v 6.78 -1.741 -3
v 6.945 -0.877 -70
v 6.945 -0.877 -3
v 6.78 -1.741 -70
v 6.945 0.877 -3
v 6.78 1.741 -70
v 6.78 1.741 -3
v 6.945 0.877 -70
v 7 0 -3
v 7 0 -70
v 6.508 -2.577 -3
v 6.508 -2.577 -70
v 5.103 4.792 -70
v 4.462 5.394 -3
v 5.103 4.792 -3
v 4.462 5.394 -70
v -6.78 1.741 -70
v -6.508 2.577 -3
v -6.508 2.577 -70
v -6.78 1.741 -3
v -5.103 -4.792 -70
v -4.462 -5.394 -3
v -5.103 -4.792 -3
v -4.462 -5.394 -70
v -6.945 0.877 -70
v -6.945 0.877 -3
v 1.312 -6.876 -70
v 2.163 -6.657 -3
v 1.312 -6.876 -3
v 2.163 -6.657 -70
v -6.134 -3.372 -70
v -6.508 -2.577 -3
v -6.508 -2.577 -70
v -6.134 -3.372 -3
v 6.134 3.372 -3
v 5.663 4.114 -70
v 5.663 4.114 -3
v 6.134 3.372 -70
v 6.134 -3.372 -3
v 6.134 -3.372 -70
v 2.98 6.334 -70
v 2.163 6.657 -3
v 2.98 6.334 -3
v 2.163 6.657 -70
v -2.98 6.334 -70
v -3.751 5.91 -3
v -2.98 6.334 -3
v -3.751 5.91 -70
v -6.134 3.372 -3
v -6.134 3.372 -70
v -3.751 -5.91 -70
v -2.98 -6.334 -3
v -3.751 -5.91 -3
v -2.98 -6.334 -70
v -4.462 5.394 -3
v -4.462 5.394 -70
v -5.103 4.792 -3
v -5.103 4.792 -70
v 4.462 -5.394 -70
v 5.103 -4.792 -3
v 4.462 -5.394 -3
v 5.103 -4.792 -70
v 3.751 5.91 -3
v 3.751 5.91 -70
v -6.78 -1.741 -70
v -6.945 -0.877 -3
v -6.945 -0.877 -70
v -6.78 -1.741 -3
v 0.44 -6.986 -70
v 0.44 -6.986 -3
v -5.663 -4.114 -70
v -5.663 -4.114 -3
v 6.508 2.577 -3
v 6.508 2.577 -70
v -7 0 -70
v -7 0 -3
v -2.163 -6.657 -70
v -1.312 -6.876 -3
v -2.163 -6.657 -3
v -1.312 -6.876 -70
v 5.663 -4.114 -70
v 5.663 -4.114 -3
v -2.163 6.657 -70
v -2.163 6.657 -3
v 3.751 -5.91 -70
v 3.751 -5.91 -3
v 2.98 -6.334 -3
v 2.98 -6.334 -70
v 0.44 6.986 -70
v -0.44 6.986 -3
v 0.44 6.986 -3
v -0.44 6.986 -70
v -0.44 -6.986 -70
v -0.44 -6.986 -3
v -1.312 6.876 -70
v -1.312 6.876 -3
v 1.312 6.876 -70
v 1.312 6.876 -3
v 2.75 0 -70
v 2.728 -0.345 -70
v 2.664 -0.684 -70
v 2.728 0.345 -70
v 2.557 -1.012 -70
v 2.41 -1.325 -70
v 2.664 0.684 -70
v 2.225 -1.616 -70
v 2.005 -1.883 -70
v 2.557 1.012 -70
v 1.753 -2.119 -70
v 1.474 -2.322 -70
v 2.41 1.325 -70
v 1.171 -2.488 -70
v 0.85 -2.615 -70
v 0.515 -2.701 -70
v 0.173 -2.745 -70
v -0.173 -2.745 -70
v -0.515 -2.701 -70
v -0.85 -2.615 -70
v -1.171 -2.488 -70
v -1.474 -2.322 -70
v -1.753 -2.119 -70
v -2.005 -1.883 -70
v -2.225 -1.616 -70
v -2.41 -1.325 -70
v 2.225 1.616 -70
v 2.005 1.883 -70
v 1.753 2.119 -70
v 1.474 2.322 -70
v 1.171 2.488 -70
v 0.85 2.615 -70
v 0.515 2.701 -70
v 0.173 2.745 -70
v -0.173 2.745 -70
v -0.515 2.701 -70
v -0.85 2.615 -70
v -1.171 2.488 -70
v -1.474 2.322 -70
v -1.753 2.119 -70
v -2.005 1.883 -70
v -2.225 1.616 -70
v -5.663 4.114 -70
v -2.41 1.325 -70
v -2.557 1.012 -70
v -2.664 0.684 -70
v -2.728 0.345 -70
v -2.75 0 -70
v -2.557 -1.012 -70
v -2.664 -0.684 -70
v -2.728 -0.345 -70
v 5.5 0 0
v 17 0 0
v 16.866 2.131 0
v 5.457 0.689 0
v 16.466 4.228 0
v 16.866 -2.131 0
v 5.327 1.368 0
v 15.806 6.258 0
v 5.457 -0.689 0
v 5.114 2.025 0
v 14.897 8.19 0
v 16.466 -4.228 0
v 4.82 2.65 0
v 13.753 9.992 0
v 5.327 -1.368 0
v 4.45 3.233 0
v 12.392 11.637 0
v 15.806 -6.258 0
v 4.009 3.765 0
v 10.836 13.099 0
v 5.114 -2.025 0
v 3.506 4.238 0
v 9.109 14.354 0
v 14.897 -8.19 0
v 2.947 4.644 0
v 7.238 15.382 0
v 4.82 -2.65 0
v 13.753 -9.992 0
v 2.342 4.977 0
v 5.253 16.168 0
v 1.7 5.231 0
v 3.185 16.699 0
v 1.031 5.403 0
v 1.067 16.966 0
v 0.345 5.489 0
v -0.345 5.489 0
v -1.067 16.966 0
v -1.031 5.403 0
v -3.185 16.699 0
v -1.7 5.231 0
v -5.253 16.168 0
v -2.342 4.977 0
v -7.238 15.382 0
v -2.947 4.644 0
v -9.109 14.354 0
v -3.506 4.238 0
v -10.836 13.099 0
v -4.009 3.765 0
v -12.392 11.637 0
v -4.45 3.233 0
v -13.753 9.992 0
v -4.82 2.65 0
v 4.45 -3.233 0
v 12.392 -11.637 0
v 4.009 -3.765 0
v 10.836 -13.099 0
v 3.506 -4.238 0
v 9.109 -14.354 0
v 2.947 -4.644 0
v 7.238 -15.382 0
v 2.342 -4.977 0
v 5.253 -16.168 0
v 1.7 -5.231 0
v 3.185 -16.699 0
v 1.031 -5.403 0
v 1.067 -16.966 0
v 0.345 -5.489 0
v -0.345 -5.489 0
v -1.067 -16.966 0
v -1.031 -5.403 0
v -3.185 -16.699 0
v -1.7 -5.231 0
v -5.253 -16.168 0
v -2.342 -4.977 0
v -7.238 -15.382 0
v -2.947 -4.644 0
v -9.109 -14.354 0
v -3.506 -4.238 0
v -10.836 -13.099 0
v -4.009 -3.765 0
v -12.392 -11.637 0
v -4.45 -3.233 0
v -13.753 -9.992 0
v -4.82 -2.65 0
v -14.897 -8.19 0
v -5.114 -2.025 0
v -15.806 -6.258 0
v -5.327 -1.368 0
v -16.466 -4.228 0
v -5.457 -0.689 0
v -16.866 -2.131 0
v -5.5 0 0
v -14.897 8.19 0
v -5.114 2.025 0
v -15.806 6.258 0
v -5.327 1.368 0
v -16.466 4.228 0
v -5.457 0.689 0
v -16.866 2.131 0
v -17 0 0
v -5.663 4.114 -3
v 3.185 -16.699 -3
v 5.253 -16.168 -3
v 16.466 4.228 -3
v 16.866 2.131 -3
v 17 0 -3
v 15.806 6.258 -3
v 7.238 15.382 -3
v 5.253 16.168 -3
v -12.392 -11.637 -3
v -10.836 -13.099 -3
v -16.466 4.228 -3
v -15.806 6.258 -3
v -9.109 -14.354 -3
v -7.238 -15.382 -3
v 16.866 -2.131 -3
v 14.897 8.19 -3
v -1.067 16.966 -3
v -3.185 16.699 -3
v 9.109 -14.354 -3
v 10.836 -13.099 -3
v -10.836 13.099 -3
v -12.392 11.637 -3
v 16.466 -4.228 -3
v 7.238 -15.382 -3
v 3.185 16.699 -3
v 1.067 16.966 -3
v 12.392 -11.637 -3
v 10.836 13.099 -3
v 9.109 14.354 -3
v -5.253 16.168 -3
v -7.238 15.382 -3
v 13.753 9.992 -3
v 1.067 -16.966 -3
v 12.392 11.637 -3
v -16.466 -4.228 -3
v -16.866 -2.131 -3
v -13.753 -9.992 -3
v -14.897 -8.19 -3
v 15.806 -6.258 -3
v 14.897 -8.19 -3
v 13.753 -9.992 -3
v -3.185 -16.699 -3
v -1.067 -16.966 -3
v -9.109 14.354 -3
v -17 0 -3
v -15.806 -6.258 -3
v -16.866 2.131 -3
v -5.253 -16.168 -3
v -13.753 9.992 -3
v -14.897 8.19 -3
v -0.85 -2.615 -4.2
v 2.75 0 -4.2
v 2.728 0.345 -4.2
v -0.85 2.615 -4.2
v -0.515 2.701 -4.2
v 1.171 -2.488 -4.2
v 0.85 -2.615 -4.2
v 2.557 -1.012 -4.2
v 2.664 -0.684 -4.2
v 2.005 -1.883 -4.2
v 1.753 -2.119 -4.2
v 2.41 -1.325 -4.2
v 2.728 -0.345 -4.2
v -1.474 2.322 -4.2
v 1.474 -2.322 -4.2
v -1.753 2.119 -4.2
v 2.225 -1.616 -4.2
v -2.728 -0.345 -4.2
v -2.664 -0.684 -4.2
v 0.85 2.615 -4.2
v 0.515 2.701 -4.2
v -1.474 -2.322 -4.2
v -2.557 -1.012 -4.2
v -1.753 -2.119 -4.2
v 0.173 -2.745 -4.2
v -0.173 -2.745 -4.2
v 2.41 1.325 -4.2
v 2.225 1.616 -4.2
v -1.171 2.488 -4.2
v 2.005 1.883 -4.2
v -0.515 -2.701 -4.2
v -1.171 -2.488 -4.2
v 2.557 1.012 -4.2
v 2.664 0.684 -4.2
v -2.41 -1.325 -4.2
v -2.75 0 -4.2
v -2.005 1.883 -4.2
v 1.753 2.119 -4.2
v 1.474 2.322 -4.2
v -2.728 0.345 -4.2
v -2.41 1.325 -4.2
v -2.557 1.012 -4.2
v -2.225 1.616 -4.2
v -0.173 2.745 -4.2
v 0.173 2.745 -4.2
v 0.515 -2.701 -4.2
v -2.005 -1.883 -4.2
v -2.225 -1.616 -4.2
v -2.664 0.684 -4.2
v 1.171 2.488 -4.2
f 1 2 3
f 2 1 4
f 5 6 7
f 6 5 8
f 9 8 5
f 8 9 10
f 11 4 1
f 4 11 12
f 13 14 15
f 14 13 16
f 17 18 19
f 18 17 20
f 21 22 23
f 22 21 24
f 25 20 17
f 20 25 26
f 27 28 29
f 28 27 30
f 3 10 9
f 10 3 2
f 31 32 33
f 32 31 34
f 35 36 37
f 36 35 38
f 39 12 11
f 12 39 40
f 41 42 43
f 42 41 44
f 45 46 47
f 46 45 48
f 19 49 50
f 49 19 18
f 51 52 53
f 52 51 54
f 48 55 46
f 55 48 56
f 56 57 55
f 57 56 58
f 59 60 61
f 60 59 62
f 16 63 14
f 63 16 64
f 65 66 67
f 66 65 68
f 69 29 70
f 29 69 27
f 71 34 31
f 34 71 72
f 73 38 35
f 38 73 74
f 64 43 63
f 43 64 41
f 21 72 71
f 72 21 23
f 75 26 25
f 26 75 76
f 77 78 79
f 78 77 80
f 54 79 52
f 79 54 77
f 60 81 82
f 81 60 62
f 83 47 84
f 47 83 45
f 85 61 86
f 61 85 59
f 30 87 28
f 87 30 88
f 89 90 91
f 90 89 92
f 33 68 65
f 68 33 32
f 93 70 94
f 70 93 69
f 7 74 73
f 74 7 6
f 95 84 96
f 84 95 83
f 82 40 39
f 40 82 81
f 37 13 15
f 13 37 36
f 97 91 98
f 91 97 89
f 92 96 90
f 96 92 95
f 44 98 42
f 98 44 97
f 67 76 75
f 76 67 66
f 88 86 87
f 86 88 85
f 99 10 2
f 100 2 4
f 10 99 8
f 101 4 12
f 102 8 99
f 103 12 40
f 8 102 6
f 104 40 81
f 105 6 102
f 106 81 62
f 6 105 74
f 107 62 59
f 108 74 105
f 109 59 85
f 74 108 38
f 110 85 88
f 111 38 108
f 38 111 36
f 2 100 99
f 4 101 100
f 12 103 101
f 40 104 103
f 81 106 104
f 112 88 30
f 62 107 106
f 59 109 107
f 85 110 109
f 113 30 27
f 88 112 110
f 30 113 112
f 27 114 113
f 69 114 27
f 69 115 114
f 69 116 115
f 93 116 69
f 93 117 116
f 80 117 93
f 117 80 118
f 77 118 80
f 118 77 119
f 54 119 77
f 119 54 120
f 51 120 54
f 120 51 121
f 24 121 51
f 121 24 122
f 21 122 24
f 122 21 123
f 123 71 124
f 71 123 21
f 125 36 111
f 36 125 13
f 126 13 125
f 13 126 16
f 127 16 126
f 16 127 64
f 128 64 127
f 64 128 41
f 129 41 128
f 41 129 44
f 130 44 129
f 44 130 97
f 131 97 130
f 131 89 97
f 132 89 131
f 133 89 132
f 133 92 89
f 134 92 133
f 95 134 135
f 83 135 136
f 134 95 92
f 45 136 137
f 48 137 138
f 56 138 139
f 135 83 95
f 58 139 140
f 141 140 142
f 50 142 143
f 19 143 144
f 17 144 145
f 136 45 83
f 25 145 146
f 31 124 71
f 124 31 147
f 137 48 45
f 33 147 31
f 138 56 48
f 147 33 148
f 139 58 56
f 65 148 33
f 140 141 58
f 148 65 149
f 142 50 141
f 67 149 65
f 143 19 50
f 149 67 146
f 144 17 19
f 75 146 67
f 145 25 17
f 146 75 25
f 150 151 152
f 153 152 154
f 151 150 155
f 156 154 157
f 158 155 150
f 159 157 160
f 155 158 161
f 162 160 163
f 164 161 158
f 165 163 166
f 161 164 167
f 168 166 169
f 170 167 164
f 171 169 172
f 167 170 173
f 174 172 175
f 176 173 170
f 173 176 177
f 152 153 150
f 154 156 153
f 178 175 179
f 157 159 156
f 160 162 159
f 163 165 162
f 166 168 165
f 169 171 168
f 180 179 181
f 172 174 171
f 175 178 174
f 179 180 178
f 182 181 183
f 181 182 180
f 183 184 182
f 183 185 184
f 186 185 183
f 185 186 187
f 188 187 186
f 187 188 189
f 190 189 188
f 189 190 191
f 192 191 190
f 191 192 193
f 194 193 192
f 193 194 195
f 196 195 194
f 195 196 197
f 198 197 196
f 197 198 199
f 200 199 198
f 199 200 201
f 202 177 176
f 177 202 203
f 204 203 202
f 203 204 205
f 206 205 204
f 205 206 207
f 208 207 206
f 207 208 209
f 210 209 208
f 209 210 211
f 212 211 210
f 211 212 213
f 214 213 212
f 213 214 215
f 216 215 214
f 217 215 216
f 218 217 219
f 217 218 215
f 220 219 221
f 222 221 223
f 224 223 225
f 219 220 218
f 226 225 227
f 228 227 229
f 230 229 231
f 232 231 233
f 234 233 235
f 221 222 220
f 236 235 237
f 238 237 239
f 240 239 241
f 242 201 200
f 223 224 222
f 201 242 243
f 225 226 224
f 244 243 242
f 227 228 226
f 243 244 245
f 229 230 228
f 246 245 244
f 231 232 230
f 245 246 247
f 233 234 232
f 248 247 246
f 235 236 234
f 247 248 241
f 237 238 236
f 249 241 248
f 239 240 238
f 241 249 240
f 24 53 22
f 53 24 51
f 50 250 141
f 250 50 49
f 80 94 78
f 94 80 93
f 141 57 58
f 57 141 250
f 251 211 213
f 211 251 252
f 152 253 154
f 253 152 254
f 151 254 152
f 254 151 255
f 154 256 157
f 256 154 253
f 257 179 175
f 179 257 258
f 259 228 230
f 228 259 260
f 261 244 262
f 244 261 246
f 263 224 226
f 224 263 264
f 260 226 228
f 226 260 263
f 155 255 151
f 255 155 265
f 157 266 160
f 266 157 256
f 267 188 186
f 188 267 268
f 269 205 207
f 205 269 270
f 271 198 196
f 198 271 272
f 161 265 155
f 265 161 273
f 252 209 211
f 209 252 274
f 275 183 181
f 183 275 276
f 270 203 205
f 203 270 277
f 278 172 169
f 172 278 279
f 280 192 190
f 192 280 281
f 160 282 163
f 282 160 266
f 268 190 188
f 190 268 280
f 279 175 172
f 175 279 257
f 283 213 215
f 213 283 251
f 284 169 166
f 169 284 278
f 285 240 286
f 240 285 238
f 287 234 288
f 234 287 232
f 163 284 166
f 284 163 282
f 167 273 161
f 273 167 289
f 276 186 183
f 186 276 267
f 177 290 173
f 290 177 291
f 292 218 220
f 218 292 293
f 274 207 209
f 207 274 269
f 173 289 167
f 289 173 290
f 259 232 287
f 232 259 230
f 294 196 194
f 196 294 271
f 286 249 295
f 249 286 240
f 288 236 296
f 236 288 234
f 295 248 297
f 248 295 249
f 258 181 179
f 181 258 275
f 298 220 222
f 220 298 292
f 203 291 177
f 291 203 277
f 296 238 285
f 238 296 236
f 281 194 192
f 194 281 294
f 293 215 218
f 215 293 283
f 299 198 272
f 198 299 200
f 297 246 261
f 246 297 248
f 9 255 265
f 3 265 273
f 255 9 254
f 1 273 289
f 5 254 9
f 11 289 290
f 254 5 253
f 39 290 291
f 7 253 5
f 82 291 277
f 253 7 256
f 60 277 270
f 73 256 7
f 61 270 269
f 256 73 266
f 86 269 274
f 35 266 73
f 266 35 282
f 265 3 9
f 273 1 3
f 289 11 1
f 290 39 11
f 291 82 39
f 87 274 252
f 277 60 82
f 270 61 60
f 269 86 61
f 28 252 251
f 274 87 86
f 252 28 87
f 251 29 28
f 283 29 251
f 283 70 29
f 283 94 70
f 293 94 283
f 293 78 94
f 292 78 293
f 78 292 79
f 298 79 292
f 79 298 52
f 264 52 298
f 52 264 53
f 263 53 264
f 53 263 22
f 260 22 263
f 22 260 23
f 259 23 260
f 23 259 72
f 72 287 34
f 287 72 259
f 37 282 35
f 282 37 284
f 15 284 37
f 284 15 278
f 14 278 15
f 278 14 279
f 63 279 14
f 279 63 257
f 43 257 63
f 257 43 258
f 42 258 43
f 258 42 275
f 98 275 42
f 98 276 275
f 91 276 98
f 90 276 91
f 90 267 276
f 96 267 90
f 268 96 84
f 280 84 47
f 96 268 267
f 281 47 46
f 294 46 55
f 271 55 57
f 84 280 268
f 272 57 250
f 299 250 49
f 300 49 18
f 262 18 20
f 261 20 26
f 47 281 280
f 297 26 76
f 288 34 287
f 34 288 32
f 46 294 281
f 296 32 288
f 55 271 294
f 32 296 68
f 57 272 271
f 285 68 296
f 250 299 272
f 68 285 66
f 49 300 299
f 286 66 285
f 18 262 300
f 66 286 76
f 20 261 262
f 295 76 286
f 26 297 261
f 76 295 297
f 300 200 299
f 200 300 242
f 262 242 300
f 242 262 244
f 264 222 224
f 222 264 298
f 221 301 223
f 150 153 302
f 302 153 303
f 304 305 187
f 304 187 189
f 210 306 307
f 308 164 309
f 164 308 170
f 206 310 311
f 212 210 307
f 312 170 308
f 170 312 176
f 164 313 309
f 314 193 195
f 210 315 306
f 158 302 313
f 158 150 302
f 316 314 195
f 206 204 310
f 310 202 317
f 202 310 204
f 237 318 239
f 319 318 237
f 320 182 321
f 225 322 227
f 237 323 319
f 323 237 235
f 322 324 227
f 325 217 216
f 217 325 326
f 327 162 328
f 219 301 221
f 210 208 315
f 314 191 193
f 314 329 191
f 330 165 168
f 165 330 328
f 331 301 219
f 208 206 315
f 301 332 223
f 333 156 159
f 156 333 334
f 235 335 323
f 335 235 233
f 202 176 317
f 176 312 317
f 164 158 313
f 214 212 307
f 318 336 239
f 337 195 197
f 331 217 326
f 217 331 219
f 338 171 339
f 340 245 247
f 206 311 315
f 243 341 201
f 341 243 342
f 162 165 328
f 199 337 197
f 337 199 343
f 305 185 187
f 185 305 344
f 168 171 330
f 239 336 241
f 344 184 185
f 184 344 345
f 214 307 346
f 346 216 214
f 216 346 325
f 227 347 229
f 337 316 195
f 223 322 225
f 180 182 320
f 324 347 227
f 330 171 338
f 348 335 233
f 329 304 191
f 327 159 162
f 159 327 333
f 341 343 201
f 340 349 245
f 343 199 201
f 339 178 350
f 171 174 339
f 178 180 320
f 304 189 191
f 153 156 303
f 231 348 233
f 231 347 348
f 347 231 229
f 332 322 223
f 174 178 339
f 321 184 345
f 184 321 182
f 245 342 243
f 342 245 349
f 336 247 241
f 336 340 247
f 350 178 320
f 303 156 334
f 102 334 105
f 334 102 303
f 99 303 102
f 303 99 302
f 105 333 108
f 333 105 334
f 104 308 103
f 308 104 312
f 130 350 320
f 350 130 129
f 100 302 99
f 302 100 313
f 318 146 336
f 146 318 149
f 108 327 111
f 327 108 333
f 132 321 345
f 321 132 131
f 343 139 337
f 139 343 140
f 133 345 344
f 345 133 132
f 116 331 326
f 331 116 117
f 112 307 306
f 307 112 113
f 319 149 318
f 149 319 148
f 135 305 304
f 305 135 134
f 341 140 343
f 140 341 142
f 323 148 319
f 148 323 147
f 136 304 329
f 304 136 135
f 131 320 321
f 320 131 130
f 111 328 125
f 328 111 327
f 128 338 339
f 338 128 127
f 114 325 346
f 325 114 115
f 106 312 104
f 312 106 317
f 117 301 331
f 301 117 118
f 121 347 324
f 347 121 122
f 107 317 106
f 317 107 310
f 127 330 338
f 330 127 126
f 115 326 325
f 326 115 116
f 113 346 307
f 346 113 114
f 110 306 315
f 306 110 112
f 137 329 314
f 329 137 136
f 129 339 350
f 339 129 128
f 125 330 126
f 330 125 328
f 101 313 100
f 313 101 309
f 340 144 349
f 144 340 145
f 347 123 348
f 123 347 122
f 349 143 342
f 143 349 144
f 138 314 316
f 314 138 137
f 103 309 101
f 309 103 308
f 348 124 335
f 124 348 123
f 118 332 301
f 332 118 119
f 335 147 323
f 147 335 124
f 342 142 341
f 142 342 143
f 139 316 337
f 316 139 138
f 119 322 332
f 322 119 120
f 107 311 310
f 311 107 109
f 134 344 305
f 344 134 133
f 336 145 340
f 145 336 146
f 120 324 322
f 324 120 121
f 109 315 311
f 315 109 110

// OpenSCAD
$fn = 50;


difference() {
	union() {
		translate(v = [0, 0, -70.0000000000]) {
			cylinder(h = 70, r = 7.0000000000);
		}
		translate(v = [0, 0, -3.0000000000]) {
			cylinder(h = 3, r = 17.0000000000);
		}
	}
	union() {
		translate(v = [0, 0, 0]) {
			rotate(a = [0, 0, 0]) {
				difference() {
					union() {
						#translate(v = [0, 0, -70.0000000000]) {
							cylinder(h = 70, r = 2.2500000000);
						}
						#translate(v = [0, 0, -4.2000000000]) {
							cylinder(h = 4.2000000000, r = 7.0000000000, r1 = 2.7500000000, r2 = 5.5000000000);
						}
						#translate(v = [0, 0, -70.0000000000]) {
							cylinder(h = 70, r = 2.7500000000);
						}
						#translate(v = [0, 0, -70.0000000000]) {
							cylinder(h = 70, r = 2.2500000000);
						}
					}
					union();
				}
			}
		}
	}
}
